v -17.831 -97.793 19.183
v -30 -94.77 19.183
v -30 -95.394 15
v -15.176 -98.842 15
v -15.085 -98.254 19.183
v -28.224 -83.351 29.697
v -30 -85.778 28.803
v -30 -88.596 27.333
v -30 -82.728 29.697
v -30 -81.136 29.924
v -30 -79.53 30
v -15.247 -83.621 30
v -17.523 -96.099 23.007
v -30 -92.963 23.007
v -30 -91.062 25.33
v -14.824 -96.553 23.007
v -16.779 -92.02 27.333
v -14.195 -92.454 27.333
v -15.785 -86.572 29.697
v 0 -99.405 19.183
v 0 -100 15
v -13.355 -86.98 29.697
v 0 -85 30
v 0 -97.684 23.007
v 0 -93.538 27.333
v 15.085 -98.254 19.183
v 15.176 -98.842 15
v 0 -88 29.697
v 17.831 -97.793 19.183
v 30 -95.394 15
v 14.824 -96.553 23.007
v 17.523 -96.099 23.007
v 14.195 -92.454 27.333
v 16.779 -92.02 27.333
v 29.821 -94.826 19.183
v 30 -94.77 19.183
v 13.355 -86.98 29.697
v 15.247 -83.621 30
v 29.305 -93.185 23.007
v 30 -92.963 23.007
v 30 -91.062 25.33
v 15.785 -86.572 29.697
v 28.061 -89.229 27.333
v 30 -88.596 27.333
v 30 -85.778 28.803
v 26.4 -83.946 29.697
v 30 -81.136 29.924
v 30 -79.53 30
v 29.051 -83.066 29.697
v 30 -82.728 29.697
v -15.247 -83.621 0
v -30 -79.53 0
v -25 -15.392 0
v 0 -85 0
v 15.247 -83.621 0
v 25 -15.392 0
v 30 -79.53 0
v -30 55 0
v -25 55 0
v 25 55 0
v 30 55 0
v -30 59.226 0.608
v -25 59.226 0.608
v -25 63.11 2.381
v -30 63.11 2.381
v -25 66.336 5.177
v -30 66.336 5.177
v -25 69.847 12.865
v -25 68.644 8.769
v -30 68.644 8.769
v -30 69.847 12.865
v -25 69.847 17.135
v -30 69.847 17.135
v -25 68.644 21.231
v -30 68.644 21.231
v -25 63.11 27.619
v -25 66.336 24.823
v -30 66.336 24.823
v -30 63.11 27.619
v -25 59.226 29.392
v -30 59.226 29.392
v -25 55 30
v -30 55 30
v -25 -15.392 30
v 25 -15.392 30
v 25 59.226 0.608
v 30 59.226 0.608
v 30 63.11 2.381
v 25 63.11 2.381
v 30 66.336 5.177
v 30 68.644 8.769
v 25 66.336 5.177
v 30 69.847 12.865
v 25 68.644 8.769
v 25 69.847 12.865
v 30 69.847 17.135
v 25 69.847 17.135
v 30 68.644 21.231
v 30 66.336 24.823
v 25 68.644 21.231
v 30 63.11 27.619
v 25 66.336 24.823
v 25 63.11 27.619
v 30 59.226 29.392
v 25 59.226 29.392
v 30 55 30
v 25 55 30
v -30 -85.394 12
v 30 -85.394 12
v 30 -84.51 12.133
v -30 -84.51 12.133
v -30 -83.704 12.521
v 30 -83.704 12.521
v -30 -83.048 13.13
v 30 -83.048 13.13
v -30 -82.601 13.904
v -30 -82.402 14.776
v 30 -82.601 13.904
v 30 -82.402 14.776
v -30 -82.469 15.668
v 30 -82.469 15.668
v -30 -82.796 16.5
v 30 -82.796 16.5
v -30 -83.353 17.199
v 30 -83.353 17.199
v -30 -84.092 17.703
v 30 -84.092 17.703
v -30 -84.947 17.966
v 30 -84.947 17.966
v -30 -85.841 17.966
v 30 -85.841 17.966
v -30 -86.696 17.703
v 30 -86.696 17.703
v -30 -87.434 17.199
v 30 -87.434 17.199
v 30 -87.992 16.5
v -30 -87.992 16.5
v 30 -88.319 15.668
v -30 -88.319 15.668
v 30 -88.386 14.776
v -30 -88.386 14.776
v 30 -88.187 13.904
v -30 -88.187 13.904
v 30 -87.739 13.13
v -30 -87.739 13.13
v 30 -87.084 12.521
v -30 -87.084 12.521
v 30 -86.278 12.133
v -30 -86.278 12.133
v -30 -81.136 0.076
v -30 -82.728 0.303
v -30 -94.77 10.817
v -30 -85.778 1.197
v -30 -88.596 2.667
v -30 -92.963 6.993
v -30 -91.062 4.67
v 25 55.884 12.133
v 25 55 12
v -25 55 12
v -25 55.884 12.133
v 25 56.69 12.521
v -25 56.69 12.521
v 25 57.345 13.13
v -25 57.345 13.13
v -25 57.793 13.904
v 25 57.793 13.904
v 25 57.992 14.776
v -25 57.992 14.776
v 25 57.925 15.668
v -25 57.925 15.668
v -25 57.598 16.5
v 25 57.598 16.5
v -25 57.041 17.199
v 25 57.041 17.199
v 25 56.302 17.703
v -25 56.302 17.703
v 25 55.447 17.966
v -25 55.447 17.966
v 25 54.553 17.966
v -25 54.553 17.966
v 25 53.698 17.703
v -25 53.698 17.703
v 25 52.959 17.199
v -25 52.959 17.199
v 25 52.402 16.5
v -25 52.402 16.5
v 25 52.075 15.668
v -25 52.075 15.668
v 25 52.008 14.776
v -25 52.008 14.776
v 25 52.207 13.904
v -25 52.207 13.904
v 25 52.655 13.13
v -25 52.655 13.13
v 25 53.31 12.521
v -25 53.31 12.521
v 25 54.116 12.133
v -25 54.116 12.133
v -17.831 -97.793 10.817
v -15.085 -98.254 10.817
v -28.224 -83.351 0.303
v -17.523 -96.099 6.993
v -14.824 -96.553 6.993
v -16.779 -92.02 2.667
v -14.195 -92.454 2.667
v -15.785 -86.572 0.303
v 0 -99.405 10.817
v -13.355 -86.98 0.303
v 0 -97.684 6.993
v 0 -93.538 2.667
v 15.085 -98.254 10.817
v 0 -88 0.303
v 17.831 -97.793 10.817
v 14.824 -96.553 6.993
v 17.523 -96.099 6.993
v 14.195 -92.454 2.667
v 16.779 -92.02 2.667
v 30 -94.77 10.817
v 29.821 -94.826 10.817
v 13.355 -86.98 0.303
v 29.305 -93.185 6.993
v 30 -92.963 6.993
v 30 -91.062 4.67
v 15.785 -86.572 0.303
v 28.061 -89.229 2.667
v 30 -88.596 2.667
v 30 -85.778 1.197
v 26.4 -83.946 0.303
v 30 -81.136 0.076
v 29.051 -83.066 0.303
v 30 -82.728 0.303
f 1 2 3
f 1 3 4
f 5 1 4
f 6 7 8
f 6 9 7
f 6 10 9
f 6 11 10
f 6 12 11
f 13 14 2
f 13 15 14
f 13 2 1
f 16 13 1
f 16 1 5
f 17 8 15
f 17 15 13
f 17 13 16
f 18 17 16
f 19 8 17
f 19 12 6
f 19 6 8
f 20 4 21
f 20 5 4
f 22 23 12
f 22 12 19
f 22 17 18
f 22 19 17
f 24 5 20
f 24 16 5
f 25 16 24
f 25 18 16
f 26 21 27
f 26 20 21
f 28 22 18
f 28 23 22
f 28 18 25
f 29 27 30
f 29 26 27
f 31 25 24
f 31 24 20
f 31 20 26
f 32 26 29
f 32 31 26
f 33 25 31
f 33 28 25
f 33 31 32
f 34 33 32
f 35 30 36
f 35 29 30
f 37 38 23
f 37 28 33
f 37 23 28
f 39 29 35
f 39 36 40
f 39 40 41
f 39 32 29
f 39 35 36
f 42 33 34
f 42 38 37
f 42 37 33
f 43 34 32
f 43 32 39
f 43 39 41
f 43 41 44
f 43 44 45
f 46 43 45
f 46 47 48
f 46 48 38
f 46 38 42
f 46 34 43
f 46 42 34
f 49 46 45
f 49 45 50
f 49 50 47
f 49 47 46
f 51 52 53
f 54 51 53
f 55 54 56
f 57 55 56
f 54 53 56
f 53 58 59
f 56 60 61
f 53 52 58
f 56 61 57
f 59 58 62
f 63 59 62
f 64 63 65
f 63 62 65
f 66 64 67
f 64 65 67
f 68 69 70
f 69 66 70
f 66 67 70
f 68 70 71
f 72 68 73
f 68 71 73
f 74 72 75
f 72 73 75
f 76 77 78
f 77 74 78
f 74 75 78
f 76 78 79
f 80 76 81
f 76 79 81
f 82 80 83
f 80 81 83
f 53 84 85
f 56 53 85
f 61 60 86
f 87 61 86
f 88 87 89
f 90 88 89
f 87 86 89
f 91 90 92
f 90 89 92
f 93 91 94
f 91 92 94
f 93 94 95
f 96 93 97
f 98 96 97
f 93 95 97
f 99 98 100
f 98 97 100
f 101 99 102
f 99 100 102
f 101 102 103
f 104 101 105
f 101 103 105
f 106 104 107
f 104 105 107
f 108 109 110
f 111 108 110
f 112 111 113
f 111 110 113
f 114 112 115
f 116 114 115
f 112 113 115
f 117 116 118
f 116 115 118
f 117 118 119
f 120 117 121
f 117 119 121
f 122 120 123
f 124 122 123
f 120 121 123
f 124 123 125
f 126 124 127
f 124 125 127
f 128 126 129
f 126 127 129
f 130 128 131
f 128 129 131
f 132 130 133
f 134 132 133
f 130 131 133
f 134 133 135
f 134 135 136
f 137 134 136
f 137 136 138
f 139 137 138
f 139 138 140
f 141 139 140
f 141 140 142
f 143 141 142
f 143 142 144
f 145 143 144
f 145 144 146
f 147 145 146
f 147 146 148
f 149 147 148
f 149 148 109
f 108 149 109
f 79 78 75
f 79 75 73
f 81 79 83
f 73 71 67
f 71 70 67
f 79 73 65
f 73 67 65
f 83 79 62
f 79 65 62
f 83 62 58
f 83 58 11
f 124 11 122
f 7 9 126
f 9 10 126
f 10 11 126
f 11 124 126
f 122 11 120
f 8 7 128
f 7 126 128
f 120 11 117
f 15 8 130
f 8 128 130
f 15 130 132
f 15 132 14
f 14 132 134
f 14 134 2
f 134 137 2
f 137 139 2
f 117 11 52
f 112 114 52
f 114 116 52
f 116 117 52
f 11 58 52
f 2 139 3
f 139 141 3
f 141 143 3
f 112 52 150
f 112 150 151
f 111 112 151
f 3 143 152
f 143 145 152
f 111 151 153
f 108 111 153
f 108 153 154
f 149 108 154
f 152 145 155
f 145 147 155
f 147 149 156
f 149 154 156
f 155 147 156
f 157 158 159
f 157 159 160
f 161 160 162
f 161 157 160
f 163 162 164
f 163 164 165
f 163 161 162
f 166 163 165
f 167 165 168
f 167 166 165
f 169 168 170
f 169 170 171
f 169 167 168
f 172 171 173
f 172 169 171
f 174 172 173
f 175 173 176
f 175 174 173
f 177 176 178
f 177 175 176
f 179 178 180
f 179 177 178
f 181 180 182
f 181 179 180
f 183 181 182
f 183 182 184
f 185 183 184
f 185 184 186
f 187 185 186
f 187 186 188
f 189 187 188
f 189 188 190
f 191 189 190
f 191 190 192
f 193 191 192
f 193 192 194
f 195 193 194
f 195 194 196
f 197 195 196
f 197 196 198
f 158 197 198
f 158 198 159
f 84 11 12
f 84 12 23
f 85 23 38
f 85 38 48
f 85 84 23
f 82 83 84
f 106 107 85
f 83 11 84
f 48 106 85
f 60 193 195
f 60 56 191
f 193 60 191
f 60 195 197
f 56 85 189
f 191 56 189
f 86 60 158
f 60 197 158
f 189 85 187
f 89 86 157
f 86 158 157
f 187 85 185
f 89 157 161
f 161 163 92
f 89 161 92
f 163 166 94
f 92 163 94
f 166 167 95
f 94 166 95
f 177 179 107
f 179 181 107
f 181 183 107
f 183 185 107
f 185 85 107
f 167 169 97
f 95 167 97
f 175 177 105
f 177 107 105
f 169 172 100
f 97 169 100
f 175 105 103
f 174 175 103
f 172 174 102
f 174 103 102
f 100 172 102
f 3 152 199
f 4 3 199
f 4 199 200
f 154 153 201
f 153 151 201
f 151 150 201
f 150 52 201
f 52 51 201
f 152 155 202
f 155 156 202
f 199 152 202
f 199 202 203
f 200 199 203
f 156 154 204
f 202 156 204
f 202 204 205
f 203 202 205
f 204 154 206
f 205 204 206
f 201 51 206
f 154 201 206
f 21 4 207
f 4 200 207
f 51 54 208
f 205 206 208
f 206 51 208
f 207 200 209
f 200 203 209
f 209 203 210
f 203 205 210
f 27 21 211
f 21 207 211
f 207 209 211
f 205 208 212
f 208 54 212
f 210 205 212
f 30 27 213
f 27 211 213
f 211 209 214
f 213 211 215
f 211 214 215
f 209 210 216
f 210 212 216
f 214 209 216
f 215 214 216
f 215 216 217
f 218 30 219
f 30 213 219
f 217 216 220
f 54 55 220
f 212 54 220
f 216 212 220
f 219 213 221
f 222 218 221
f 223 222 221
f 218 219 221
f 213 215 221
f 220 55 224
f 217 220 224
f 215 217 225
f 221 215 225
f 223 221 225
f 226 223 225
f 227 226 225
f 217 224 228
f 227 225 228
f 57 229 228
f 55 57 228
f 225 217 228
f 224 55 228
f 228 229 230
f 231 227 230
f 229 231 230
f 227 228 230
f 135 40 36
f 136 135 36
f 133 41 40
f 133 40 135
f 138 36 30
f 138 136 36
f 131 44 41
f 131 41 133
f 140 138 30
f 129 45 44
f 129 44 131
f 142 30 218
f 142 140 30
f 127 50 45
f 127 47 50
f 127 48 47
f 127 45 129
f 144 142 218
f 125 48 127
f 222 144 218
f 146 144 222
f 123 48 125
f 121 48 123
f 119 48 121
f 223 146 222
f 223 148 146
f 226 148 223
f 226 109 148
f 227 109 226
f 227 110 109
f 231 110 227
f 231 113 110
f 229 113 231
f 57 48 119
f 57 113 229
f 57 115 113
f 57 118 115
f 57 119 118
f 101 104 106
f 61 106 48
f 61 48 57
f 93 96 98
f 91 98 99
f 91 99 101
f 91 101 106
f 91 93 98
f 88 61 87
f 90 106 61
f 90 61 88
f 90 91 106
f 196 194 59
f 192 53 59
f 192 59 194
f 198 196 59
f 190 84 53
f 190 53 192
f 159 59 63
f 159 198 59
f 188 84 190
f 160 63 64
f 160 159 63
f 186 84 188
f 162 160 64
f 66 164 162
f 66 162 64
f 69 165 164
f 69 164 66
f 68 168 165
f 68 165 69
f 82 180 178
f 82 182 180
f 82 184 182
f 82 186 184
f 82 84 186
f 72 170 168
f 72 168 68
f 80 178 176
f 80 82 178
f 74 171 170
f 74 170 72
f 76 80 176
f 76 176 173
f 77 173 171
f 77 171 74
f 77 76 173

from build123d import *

# Parameters (mm, degrees)
EXTRUDE_1_DEPTH     = 30
SKETCH_2_R          = 3
CUT_EXTRUDE_1_DEPTH = 87
SKETCH_3_W          = 50
SKETCH_3_H          = 85.391611022
CUT_EXTRUDE_2_DEPTH = 87
SKETCH_4_R          = 3
EXTRUDE_2_DEPTH     = 56
FILLET_1_R          = 15
FILLET_2_R          = 15
CUT_EXTRUDE_3_DEPTH = 85


with BuildPart() as part:
    # 草图1 → 凸台-拉伸1 (new body)
    with BuildSketch(Plane.XY):
        with BuildLine():
            Line((30, -95.393920142), (30, 70))
            Line((30, 70), (-30, 70))
            Line((-30, 70), (-30, -95.393920142))
            ThreePointArc((-30, -95.393920142), (0, -100), (30, -95.393920142))
        make_face()
    extrude(amount=EXTRUDE_1_DEPTH)

    # 草图2 → 切除-拉伸1 (cut)
    with BuildSketch(Plane(origin=(30, 0, 0), x_dir=(0, 0, -1), z_dir=(1, 0, 0))):
        with Locations((-15, -85.393920142)):
            Circle(SKETCH_2_R)
    extrude(amount=-CUT_EXTRUDE_1_DEPTH, mode=Mode.SUBTRACT)

    # 草图3 → 切除-拉伸2 (cut)
    with BuildSketch(Plane.XY.offset(30)):
        with Locations((0, 27.304194489)):
            Rectangle(SKETCH_3_W, SKETCH_3_H)
    extrude(amount=-CUT_EXTRUDE_2_DEPTH, mode=Mode.SUBTRACT)

    # 草图4 → 凸台-拉伸2 (add)
    with BuildSketch(Plane(origin=(30, 0, 0), x_dir=(0, 0, -1), z_dir=(1, 0, 0))):
        with Locations((-15, 55)):
            Circle(SKETCH_4_R)
    extrude(amount=-EXTRUDE_2_DEPTH)

    # 圆角1
    fillet_1_edges = [part.edges().sort_by_distance(p)[0] for p in [
        (0, -100, 30),
    ]]
    fillet(fillet_1_edges, radius=FILLET_1_R)

    # 圆角2
    fillet_2_edges = [part.edges().sort_by_distance(p)[0] for p in [
        (0, -100, 0),
    ]]
    fillet(fillet_2_edges, radius=FILLET_2_R - 0.0001)  # a hair under: the kernel refuses the full size

    # 草图5 → 切除-拉伸3 (cut)
    with BuildSketch(Plane.ZY.offset(30)):
        with BuildLine():
            Line((30, 55), (48.391224998, 55))
            Line((48.391224998, 55), (48.391224998, 76.557809972))
            Line((48.391224998, 76.557809972), (-10.714250248, 76.557809972))
            Line((-10.714250248, 76.557809972), (-10.714250248, 55))
            Line((-10.714250248, 55), (0, 55))
            ThreePointArc((0, 55), (15, 70), (30, 55))
        make_face()
    extrude(amount=-CUT_EXTRUDE_3_DEPTH, mode=Mode.SUBTRACT)


solid = part.part
